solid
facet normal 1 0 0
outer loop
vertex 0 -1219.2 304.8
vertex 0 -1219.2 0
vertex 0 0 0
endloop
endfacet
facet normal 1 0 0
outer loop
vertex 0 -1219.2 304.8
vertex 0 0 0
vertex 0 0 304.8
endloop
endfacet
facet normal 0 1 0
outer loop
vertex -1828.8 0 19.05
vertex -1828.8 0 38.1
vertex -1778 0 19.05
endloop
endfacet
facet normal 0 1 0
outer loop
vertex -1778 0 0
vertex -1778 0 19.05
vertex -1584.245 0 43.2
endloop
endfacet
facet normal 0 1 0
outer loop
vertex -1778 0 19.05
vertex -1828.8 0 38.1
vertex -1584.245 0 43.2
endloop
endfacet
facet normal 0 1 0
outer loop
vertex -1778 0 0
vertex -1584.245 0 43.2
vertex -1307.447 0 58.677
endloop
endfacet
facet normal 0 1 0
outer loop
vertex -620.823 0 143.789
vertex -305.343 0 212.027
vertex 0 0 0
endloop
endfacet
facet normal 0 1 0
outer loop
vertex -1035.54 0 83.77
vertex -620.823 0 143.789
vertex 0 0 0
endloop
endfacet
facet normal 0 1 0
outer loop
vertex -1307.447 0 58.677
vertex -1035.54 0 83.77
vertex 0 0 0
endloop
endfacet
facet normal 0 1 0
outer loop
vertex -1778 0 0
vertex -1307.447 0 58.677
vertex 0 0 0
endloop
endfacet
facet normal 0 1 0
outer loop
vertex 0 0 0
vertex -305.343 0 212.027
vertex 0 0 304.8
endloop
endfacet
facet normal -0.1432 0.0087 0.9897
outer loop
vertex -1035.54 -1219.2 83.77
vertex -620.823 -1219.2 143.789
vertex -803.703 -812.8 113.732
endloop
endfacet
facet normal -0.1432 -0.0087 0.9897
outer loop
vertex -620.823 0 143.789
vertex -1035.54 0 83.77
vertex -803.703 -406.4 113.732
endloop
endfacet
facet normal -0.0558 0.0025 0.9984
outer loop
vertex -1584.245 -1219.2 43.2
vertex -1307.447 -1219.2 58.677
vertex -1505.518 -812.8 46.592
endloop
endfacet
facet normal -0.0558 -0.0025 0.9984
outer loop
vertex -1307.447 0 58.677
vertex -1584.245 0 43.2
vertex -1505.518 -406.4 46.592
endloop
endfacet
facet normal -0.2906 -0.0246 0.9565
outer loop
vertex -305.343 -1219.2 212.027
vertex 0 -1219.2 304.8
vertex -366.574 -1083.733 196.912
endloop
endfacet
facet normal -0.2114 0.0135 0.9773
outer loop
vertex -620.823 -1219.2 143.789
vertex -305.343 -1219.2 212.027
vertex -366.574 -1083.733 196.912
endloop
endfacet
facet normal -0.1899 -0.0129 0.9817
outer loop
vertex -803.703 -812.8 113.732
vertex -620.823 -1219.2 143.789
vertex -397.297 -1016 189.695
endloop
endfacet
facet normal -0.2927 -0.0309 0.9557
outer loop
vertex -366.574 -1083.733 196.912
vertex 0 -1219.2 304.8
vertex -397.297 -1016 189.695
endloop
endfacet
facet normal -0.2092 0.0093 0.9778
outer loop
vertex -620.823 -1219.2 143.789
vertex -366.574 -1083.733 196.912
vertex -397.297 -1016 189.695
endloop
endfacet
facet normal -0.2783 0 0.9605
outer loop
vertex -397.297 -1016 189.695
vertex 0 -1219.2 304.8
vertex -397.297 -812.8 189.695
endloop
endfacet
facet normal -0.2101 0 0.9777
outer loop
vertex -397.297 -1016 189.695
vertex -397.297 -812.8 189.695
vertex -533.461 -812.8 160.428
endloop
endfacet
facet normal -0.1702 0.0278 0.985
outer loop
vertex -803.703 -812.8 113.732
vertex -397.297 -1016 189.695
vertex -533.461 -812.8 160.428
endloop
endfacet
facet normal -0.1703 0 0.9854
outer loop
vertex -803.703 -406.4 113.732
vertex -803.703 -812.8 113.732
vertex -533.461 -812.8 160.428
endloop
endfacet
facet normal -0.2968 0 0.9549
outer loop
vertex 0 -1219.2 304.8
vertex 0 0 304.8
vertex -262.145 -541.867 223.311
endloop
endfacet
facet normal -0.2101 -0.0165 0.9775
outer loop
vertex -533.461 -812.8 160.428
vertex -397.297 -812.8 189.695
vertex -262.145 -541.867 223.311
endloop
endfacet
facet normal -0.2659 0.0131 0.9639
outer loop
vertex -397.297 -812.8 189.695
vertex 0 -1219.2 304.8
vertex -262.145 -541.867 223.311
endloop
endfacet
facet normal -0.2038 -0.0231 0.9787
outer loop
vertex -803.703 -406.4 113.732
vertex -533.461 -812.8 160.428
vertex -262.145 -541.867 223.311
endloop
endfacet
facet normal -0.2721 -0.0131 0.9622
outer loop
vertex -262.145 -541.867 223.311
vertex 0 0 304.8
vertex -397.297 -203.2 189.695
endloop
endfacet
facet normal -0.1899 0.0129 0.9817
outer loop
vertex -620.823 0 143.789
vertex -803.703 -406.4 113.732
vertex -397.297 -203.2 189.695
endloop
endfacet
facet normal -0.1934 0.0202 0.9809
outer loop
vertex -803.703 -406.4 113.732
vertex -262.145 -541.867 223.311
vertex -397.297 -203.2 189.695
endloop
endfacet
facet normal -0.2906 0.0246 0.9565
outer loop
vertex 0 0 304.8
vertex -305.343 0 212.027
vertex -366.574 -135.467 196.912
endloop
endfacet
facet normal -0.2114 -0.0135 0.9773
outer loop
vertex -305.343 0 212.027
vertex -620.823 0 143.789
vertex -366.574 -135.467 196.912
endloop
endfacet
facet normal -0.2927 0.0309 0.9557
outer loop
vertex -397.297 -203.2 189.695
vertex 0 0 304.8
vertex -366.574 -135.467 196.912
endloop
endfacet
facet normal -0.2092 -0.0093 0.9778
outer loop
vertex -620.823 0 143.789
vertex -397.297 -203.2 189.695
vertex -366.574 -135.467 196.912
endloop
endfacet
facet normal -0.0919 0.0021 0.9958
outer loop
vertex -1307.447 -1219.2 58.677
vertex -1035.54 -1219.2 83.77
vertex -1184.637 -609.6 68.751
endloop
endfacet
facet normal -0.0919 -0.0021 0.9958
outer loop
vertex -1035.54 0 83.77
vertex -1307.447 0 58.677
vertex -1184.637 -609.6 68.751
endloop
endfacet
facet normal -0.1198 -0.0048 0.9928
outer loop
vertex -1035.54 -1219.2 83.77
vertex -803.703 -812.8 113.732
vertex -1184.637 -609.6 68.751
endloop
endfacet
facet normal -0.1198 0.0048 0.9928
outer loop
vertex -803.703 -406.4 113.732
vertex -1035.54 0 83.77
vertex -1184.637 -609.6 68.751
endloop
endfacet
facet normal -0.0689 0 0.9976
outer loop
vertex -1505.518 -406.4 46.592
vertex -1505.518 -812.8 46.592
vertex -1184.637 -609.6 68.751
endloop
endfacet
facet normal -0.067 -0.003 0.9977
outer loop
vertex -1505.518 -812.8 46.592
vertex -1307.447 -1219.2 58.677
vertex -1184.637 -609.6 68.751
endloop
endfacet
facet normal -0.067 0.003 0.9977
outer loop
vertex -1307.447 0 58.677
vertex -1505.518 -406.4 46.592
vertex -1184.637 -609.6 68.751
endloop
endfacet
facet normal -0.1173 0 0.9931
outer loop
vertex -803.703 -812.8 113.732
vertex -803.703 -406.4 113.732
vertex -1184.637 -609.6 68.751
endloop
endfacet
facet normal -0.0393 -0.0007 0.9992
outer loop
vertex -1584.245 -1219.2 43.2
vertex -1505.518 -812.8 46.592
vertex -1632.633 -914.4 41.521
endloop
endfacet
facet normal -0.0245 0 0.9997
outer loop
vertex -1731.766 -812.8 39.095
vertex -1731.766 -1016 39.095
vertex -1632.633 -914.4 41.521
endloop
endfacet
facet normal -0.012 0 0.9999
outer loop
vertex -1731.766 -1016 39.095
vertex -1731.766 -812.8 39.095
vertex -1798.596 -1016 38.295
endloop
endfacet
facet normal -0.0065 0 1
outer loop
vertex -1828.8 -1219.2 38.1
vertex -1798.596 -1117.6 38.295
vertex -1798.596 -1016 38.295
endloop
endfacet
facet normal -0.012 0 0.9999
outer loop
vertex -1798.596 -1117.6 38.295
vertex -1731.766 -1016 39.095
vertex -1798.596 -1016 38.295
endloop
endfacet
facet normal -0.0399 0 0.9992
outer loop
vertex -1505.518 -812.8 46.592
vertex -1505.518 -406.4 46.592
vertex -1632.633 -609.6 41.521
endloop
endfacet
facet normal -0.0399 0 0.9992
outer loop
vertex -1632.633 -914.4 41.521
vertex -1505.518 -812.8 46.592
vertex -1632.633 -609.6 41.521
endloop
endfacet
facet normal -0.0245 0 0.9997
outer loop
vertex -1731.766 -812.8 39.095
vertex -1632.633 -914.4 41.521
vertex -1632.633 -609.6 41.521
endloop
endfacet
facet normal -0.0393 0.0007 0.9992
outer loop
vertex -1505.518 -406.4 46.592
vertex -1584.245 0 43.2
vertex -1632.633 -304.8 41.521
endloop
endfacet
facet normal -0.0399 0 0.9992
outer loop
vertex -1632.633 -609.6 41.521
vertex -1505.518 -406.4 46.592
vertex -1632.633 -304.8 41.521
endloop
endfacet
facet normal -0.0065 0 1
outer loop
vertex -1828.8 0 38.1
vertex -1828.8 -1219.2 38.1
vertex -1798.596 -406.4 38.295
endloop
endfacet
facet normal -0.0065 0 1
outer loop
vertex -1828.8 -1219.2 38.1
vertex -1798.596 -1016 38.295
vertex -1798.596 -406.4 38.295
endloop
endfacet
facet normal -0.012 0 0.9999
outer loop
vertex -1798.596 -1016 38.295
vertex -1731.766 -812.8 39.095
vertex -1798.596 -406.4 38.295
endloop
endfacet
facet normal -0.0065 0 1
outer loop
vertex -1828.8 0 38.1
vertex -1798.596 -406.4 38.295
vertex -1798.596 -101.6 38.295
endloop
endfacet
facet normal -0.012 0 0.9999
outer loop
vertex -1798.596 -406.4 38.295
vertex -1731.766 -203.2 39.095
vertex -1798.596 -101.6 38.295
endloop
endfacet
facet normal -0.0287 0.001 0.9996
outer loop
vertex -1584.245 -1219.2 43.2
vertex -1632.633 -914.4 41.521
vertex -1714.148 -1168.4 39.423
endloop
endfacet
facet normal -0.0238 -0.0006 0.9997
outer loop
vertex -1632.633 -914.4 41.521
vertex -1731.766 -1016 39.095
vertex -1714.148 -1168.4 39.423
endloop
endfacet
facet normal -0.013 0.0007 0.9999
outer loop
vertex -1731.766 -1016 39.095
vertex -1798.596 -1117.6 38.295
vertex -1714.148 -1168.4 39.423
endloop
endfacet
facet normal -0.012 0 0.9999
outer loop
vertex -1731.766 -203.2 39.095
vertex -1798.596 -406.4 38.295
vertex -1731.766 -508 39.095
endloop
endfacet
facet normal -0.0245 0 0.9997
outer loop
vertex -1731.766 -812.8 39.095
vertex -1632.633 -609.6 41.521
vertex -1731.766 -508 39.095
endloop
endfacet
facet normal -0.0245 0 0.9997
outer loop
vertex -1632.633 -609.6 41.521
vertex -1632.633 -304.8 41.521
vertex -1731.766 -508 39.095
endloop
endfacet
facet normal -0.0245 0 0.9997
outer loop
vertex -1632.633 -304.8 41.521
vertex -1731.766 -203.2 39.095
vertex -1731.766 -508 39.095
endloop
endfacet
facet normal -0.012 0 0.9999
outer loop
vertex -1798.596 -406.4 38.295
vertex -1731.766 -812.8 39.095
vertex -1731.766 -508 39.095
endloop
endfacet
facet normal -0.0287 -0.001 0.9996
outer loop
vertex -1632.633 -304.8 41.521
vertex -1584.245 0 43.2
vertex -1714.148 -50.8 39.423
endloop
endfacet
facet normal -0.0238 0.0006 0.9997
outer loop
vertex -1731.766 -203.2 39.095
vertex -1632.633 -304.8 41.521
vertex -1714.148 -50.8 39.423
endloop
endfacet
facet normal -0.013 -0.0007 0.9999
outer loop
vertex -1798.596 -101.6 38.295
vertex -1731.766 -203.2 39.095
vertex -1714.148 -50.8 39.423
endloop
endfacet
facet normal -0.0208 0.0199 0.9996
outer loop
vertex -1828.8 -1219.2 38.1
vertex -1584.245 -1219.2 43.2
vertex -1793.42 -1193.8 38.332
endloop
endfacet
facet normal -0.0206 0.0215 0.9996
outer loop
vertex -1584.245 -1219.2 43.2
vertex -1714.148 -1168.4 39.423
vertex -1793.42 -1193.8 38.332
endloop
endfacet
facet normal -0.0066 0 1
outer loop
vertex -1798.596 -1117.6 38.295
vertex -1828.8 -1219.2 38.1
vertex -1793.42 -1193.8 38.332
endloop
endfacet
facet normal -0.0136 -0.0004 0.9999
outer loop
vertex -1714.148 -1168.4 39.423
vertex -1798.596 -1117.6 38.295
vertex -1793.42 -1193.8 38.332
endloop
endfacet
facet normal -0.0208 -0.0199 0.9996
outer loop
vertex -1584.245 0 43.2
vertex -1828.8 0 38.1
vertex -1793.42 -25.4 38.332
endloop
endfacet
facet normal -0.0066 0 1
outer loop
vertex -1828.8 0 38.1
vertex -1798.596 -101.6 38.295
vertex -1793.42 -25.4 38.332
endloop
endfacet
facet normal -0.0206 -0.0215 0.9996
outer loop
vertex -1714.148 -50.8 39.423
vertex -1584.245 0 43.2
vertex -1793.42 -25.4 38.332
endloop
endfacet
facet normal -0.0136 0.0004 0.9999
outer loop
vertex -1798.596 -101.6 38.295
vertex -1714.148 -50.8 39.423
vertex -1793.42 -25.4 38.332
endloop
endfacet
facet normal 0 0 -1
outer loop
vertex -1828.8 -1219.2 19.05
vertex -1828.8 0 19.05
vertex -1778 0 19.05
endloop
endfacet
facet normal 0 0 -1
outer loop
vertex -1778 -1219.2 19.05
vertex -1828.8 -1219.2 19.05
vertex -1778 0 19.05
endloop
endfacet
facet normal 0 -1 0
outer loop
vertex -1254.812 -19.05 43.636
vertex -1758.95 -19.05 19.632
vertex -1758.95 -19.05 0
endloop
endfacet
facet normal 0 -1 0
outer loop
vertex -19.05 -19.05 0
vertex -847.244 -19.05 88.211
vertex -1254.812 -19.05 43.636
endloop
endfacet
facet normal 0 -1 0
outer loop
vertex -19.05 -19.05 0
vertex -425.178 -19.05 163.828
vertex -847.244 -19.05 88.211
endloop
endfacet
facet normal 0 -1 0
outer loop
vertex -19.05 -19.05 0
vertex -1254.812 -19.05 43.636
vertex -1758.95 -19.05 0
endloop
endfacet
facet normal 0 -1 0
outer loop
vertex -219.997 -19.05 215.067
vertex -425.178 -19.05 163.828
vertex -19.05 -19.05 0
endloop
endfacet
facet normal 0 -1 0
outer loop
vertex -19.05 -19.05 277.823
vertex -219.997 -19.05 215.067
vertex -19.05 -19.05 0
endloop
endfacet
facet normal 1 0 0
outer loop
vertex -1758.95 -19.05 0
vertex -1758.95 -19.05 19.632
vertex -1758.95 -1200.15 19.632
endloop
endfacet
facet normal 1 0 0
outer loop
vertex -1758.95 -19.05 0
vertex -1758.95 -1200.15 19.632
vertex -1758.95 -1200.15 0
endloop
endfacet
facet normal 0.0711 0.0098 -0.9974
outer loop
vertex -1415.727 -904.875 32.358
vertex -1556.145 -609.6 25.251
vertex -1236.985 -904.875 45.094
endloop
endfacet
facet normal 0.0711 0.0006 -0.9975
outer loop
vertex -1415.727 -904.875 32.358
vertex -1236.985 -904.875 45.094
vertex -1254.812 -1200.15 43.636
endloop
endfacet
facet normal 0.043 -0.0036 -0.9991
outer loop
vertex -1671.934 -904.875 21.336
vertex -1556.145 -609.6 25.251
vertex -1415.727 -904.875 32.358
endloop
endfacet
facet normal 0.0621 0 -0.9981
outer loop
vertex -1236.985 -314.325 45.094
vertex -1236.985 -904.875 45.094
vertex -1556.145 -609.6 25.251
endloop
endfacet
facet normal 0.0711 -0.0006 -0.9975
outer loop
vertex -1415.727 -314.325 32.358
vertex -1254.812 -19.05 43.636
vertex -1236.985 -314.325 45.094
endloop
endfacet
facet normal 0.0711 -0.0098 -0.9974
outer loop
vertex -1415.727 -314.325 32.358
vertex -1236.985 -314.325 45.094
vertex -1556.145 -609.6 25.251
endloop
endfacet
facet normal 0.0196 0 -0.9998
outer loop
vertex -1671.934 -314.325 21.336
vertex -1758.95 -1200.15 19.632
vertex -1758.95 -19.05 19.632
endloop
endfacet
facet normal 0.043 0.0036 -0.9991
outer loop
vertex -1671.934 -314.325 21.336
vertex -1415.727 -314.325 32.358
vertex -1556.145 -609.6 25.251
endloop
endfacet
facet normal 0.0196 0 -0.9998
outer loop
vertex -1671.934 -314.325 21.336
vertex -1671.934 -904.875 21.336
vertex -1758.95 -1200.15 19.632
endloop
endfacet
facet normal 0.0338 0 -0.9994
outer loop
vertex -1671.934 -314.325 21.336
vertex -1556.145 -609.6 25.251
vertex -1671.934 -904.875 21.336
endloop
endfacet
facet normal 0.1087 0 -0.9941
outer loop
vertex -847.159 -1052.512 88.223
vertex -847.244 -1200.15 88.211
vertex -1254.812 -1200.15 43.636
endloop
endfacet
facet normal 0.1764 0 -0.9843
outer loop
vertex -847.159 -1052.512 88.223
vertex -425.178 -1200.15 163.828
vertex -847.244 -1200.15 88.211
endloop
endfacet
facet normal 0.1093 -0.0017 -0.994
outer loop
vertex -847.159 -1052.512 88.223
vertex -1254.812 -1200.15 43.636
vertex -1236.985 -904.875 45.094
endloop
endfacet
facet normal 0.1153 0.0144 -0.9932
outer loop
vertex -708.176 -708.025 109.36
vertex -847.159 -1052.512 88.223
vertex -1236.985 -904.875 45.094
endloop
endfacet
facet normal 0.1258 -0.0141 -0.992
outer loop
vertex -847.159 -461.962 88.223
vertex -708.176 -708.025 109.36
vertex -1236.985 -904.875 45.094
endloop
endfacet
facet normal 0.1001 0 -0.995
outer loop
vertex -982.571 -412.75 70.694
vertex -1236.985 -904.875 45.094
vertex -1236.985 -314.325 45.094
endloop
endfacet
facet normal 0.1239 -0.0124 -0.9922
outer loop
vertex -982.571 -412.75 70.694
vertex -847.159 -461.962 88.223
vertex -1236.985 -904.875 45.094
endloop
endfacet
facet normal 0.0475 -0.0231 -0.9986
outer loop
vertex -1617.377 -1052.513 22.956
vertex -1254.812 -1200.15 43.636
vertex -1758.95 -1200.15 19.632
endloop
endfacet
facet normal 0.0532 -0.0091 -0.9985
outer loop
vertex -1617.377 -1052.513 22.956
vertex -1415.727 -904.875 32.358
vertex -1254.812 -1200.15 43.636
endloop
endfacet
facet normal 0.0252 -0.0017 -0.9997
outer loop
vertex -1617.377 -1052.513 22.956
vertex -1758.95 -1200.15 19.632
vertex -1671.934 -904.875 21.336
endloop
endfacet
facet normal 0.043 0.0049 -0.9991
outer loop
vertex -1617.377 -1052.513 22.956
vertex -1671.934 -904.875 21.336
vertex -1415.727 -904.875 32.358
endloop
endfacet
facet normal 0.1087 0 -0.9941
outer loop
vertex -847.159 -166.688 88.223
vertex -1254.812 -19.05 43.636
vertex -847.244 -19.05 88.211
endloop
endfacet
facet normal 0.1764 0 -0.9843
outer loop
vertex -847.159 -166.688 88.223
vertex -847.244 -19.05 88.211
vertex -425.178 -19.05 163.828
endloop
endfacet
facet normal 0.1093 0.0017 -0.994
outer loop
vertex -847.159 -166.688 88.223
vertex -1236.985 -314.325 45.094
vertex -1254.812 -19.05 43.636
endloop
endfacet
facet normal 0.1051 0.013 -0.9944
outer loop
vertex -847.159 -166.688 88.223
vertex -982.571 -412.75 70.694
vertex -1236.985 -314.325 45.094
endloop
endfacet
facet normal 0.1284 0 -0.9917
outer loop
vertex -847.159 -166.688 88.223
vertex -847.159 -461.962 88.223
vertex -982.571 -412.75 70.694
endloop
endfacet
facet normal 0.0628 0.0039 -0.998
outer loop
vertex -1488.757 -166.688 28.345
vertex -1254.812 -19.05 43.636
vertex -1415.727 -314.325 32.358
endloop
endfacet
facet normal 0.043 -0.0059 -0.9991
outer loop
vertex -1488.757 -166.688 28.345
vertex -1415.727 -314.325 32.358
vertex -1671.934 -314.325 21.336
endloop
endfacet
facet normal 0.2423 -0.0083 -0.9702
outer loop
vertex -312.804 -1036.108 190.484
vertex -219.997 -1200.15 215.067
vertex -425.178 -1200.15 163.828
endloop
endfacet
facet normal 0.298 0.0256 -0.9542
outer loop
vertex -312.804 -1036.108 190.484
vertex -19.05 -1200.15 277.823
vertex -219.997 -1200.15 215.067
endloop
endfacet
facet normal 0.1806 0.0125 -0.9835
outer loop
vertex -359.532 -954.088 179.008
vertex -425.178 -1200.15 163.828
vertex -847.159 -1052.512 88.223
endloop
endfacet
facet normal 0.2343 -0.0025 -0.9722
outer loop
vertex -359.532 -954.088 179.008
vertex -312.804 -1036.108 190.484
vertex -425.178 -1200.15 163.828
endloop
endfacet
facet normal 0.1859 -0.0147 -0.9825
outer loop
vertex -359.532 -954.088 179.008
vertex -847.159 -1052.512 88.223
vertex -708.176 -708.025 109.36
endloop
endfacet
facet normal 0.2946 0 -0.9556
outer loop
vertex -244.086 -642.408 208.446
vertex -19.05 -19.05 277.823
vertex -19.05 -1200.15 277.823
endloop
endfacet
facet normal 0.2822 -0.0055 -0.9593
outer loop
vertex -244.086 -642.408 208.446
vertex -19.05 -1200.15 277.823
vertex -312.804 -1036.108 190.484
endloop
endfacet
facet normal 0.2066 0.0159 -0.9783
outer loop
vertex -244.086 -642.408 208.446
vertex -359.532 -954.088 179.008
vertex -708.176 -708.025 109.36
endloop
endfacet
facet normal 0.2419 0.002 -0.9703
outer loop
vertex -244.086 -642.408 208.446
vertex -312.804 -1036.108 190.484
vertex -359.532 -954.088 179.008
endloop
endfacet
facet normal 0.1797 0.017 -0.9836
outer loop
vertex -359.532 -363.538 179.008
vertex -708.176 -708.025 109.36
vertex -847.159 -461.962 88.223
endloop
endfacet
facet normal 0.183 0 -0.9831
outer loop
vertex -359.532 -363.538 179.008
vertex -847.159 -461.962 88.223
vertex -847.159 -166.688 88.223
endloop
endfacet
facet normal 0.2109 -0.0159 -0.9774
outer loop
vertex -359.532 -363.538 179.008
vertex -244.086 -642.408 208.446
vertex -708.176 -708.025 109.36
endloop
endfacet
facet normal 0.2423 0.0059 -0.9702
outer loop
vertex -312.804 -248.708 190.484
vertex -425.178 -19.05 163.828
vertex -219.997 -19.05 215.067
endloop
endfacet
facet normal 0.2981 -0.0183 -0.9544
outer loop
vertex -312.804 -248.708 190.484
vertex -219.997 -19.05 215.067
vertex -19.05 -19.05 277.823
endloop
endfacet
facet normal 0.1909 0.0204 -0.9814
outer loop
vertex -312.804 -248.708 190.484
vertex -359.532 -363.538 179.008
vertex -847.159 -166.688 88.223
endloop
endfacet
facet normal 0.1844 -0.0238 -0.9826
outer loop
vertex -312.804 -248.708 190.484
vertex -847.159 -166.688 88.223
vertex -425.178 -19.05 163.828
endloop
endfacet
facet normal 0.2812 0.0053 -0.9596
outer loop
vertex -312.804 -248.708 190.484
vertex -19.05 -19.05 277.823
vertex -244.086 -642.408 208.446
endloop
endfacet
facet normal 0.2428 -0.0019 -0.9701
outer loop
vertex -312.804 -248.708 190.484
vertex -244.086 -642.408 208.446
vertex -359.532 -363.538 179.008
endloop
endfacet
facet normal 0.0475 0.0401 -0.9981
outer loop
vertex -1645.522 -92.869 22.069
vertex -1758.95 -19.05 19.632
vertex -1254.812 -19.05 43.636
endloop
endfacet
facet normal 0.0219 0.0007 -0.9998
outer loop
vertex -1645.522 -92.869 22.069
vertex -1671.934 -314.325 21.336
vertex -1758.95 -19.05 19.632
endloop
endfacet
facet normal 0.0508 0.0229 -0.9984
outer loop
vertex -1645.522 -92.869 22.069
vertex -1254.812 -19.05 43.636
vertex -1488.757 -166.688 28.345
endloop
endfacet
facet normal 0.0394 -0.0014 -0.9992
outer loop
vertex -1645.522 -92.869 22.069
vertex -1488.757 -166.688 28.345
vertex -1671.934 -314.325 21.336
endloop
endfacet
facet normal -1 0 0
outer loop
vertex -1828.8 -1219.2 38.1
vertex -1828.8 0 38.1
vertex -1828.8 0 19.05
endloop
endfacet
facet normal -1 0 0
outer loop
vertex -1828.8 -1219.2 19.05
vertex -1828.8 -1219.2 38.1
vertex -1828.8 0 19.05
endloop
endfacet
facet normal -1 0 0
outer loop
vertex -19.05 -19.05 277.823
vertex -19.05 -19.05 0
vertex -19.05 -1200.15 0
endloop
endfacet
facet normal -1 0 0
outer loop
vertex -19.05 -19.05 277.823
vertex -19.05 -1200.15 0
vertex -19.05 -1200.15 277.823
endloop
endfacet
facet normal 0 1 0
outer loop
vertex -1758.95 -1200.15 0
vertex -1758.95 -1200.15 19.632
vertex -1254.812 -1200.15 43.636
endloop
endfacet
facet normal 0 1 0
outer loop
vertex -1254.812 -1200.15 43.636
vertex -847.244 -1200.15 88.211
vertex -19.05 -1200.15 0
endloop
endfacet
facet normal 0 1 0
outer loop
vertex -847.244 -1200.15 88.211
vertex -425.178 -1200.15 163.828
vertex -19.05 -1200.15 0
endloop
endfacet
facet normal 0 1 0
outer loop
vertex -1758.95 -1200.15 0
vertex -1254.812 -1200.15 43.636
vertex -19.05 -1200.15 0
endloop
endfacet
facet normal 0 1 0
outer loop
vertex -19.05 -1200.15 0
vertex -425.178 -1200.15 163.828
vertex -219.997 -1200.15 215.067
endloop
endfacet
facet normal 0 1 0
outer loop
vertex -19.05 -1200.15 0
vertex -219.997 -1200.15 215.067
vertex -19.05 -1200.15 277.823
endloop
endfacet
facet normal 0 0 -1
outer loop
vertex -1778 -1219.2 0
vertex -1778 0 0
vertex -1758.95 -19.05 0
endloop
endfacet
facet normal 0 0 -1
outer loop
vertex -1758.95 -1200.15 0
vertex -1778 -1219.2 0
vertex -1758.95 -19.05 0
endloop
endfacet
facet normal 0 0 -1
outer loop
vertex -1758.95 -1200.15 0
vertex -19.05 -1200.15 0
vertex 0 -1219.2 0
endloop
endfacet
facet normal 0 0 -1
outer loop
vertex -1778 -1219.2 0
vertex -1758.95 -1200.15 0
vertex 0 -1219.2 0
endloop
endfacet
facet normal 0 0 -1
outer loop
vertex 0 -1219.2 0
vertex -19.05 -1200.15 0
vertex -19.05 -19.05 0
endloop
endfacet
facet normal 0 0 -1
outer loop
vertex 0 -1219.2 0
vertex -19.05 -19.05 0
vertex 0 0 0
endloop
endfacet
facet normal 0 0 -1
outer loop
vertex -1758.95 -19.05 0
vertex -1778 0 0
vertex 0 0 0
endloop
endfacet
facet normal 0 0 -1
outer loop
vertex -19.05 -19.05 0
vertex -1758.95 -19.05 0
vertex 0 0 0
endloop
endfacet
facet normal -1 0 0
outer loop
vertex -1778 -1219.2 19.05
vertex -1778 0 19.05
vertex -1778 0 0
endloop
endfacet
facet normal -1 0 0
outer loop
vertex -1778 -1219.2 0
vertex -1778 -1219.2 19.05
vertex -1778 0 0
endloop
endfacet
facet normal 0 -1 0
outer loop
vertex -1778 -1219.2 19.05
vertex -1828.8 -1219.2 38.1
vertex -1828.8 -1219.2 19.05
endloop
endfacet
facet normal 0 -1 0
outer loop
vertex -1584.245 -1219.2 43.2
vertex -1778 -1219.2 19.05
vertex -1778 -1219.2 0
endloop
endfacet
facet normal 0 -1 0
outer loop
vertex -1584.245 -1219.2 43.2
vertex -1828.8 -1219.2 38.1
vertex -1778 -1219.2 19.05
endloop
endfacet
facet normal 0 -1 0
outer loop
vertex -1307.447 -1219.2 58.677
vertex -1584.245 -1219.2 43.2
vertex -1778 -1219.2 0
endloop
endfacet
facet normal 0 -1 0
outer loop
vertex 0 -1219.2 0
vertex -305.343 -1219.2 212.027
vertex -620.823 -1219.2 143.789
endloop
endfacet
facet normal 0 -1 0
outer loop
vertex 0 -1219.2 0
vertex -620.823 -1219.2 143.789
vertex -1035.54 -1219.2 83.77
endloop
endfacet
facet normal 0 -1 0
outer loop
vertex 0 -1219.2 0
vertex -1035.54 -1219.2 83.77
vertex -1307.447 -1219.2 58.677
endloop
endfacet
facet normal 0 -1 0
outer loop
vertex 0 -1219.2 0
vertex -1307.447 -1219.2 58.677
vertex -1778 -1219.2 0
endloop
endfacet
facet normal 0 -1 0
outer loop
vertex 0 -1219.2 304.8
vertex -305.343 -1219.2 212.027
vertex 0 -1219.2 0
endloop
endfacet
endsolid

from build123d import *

# Parameters (mm, degrees)
F1_DEPTH = 1219.2
F2_T     = -19.05


with BuildPart() as f1:
    # F0 (on Front) → F1 (new body)
    with BuildSketch(Plane.XZ):
        with BuildLine():
            Line((-1778, 0), (0, 0))
            Line((0, 0), (0, 304.8))
            add(Edge.make_bspline(
                [(0, 304.8), (-762.4312639236, 30.0072385311), (-1787.0007753372, 39.029404521), (-1828.8, 38.1)],
                knots=[0, 0, 0, 0, 1848.1445641508, 1848.1445641508, 1848.1445641508, 1848.1445641508], degree=3))
            Line((-1828.8, 38.1), (-1828.8, 19.05))
            Line((-1828.8, 19.05), (-1778, 19.05))
            Line((-1778, 19.05), (-1778, 0))
        make_face()
    extrude(amount=F1_DEPTH)

    # F2
    f2_openings = [f1.faces().sort_by_distance(p)[0] for p in [
        (-889, -609.6, 0),
    ]]
    offset(amount=F2_T, openings=f2_openings, kind=Kind.INTERSECTION)


solid = f1.part
